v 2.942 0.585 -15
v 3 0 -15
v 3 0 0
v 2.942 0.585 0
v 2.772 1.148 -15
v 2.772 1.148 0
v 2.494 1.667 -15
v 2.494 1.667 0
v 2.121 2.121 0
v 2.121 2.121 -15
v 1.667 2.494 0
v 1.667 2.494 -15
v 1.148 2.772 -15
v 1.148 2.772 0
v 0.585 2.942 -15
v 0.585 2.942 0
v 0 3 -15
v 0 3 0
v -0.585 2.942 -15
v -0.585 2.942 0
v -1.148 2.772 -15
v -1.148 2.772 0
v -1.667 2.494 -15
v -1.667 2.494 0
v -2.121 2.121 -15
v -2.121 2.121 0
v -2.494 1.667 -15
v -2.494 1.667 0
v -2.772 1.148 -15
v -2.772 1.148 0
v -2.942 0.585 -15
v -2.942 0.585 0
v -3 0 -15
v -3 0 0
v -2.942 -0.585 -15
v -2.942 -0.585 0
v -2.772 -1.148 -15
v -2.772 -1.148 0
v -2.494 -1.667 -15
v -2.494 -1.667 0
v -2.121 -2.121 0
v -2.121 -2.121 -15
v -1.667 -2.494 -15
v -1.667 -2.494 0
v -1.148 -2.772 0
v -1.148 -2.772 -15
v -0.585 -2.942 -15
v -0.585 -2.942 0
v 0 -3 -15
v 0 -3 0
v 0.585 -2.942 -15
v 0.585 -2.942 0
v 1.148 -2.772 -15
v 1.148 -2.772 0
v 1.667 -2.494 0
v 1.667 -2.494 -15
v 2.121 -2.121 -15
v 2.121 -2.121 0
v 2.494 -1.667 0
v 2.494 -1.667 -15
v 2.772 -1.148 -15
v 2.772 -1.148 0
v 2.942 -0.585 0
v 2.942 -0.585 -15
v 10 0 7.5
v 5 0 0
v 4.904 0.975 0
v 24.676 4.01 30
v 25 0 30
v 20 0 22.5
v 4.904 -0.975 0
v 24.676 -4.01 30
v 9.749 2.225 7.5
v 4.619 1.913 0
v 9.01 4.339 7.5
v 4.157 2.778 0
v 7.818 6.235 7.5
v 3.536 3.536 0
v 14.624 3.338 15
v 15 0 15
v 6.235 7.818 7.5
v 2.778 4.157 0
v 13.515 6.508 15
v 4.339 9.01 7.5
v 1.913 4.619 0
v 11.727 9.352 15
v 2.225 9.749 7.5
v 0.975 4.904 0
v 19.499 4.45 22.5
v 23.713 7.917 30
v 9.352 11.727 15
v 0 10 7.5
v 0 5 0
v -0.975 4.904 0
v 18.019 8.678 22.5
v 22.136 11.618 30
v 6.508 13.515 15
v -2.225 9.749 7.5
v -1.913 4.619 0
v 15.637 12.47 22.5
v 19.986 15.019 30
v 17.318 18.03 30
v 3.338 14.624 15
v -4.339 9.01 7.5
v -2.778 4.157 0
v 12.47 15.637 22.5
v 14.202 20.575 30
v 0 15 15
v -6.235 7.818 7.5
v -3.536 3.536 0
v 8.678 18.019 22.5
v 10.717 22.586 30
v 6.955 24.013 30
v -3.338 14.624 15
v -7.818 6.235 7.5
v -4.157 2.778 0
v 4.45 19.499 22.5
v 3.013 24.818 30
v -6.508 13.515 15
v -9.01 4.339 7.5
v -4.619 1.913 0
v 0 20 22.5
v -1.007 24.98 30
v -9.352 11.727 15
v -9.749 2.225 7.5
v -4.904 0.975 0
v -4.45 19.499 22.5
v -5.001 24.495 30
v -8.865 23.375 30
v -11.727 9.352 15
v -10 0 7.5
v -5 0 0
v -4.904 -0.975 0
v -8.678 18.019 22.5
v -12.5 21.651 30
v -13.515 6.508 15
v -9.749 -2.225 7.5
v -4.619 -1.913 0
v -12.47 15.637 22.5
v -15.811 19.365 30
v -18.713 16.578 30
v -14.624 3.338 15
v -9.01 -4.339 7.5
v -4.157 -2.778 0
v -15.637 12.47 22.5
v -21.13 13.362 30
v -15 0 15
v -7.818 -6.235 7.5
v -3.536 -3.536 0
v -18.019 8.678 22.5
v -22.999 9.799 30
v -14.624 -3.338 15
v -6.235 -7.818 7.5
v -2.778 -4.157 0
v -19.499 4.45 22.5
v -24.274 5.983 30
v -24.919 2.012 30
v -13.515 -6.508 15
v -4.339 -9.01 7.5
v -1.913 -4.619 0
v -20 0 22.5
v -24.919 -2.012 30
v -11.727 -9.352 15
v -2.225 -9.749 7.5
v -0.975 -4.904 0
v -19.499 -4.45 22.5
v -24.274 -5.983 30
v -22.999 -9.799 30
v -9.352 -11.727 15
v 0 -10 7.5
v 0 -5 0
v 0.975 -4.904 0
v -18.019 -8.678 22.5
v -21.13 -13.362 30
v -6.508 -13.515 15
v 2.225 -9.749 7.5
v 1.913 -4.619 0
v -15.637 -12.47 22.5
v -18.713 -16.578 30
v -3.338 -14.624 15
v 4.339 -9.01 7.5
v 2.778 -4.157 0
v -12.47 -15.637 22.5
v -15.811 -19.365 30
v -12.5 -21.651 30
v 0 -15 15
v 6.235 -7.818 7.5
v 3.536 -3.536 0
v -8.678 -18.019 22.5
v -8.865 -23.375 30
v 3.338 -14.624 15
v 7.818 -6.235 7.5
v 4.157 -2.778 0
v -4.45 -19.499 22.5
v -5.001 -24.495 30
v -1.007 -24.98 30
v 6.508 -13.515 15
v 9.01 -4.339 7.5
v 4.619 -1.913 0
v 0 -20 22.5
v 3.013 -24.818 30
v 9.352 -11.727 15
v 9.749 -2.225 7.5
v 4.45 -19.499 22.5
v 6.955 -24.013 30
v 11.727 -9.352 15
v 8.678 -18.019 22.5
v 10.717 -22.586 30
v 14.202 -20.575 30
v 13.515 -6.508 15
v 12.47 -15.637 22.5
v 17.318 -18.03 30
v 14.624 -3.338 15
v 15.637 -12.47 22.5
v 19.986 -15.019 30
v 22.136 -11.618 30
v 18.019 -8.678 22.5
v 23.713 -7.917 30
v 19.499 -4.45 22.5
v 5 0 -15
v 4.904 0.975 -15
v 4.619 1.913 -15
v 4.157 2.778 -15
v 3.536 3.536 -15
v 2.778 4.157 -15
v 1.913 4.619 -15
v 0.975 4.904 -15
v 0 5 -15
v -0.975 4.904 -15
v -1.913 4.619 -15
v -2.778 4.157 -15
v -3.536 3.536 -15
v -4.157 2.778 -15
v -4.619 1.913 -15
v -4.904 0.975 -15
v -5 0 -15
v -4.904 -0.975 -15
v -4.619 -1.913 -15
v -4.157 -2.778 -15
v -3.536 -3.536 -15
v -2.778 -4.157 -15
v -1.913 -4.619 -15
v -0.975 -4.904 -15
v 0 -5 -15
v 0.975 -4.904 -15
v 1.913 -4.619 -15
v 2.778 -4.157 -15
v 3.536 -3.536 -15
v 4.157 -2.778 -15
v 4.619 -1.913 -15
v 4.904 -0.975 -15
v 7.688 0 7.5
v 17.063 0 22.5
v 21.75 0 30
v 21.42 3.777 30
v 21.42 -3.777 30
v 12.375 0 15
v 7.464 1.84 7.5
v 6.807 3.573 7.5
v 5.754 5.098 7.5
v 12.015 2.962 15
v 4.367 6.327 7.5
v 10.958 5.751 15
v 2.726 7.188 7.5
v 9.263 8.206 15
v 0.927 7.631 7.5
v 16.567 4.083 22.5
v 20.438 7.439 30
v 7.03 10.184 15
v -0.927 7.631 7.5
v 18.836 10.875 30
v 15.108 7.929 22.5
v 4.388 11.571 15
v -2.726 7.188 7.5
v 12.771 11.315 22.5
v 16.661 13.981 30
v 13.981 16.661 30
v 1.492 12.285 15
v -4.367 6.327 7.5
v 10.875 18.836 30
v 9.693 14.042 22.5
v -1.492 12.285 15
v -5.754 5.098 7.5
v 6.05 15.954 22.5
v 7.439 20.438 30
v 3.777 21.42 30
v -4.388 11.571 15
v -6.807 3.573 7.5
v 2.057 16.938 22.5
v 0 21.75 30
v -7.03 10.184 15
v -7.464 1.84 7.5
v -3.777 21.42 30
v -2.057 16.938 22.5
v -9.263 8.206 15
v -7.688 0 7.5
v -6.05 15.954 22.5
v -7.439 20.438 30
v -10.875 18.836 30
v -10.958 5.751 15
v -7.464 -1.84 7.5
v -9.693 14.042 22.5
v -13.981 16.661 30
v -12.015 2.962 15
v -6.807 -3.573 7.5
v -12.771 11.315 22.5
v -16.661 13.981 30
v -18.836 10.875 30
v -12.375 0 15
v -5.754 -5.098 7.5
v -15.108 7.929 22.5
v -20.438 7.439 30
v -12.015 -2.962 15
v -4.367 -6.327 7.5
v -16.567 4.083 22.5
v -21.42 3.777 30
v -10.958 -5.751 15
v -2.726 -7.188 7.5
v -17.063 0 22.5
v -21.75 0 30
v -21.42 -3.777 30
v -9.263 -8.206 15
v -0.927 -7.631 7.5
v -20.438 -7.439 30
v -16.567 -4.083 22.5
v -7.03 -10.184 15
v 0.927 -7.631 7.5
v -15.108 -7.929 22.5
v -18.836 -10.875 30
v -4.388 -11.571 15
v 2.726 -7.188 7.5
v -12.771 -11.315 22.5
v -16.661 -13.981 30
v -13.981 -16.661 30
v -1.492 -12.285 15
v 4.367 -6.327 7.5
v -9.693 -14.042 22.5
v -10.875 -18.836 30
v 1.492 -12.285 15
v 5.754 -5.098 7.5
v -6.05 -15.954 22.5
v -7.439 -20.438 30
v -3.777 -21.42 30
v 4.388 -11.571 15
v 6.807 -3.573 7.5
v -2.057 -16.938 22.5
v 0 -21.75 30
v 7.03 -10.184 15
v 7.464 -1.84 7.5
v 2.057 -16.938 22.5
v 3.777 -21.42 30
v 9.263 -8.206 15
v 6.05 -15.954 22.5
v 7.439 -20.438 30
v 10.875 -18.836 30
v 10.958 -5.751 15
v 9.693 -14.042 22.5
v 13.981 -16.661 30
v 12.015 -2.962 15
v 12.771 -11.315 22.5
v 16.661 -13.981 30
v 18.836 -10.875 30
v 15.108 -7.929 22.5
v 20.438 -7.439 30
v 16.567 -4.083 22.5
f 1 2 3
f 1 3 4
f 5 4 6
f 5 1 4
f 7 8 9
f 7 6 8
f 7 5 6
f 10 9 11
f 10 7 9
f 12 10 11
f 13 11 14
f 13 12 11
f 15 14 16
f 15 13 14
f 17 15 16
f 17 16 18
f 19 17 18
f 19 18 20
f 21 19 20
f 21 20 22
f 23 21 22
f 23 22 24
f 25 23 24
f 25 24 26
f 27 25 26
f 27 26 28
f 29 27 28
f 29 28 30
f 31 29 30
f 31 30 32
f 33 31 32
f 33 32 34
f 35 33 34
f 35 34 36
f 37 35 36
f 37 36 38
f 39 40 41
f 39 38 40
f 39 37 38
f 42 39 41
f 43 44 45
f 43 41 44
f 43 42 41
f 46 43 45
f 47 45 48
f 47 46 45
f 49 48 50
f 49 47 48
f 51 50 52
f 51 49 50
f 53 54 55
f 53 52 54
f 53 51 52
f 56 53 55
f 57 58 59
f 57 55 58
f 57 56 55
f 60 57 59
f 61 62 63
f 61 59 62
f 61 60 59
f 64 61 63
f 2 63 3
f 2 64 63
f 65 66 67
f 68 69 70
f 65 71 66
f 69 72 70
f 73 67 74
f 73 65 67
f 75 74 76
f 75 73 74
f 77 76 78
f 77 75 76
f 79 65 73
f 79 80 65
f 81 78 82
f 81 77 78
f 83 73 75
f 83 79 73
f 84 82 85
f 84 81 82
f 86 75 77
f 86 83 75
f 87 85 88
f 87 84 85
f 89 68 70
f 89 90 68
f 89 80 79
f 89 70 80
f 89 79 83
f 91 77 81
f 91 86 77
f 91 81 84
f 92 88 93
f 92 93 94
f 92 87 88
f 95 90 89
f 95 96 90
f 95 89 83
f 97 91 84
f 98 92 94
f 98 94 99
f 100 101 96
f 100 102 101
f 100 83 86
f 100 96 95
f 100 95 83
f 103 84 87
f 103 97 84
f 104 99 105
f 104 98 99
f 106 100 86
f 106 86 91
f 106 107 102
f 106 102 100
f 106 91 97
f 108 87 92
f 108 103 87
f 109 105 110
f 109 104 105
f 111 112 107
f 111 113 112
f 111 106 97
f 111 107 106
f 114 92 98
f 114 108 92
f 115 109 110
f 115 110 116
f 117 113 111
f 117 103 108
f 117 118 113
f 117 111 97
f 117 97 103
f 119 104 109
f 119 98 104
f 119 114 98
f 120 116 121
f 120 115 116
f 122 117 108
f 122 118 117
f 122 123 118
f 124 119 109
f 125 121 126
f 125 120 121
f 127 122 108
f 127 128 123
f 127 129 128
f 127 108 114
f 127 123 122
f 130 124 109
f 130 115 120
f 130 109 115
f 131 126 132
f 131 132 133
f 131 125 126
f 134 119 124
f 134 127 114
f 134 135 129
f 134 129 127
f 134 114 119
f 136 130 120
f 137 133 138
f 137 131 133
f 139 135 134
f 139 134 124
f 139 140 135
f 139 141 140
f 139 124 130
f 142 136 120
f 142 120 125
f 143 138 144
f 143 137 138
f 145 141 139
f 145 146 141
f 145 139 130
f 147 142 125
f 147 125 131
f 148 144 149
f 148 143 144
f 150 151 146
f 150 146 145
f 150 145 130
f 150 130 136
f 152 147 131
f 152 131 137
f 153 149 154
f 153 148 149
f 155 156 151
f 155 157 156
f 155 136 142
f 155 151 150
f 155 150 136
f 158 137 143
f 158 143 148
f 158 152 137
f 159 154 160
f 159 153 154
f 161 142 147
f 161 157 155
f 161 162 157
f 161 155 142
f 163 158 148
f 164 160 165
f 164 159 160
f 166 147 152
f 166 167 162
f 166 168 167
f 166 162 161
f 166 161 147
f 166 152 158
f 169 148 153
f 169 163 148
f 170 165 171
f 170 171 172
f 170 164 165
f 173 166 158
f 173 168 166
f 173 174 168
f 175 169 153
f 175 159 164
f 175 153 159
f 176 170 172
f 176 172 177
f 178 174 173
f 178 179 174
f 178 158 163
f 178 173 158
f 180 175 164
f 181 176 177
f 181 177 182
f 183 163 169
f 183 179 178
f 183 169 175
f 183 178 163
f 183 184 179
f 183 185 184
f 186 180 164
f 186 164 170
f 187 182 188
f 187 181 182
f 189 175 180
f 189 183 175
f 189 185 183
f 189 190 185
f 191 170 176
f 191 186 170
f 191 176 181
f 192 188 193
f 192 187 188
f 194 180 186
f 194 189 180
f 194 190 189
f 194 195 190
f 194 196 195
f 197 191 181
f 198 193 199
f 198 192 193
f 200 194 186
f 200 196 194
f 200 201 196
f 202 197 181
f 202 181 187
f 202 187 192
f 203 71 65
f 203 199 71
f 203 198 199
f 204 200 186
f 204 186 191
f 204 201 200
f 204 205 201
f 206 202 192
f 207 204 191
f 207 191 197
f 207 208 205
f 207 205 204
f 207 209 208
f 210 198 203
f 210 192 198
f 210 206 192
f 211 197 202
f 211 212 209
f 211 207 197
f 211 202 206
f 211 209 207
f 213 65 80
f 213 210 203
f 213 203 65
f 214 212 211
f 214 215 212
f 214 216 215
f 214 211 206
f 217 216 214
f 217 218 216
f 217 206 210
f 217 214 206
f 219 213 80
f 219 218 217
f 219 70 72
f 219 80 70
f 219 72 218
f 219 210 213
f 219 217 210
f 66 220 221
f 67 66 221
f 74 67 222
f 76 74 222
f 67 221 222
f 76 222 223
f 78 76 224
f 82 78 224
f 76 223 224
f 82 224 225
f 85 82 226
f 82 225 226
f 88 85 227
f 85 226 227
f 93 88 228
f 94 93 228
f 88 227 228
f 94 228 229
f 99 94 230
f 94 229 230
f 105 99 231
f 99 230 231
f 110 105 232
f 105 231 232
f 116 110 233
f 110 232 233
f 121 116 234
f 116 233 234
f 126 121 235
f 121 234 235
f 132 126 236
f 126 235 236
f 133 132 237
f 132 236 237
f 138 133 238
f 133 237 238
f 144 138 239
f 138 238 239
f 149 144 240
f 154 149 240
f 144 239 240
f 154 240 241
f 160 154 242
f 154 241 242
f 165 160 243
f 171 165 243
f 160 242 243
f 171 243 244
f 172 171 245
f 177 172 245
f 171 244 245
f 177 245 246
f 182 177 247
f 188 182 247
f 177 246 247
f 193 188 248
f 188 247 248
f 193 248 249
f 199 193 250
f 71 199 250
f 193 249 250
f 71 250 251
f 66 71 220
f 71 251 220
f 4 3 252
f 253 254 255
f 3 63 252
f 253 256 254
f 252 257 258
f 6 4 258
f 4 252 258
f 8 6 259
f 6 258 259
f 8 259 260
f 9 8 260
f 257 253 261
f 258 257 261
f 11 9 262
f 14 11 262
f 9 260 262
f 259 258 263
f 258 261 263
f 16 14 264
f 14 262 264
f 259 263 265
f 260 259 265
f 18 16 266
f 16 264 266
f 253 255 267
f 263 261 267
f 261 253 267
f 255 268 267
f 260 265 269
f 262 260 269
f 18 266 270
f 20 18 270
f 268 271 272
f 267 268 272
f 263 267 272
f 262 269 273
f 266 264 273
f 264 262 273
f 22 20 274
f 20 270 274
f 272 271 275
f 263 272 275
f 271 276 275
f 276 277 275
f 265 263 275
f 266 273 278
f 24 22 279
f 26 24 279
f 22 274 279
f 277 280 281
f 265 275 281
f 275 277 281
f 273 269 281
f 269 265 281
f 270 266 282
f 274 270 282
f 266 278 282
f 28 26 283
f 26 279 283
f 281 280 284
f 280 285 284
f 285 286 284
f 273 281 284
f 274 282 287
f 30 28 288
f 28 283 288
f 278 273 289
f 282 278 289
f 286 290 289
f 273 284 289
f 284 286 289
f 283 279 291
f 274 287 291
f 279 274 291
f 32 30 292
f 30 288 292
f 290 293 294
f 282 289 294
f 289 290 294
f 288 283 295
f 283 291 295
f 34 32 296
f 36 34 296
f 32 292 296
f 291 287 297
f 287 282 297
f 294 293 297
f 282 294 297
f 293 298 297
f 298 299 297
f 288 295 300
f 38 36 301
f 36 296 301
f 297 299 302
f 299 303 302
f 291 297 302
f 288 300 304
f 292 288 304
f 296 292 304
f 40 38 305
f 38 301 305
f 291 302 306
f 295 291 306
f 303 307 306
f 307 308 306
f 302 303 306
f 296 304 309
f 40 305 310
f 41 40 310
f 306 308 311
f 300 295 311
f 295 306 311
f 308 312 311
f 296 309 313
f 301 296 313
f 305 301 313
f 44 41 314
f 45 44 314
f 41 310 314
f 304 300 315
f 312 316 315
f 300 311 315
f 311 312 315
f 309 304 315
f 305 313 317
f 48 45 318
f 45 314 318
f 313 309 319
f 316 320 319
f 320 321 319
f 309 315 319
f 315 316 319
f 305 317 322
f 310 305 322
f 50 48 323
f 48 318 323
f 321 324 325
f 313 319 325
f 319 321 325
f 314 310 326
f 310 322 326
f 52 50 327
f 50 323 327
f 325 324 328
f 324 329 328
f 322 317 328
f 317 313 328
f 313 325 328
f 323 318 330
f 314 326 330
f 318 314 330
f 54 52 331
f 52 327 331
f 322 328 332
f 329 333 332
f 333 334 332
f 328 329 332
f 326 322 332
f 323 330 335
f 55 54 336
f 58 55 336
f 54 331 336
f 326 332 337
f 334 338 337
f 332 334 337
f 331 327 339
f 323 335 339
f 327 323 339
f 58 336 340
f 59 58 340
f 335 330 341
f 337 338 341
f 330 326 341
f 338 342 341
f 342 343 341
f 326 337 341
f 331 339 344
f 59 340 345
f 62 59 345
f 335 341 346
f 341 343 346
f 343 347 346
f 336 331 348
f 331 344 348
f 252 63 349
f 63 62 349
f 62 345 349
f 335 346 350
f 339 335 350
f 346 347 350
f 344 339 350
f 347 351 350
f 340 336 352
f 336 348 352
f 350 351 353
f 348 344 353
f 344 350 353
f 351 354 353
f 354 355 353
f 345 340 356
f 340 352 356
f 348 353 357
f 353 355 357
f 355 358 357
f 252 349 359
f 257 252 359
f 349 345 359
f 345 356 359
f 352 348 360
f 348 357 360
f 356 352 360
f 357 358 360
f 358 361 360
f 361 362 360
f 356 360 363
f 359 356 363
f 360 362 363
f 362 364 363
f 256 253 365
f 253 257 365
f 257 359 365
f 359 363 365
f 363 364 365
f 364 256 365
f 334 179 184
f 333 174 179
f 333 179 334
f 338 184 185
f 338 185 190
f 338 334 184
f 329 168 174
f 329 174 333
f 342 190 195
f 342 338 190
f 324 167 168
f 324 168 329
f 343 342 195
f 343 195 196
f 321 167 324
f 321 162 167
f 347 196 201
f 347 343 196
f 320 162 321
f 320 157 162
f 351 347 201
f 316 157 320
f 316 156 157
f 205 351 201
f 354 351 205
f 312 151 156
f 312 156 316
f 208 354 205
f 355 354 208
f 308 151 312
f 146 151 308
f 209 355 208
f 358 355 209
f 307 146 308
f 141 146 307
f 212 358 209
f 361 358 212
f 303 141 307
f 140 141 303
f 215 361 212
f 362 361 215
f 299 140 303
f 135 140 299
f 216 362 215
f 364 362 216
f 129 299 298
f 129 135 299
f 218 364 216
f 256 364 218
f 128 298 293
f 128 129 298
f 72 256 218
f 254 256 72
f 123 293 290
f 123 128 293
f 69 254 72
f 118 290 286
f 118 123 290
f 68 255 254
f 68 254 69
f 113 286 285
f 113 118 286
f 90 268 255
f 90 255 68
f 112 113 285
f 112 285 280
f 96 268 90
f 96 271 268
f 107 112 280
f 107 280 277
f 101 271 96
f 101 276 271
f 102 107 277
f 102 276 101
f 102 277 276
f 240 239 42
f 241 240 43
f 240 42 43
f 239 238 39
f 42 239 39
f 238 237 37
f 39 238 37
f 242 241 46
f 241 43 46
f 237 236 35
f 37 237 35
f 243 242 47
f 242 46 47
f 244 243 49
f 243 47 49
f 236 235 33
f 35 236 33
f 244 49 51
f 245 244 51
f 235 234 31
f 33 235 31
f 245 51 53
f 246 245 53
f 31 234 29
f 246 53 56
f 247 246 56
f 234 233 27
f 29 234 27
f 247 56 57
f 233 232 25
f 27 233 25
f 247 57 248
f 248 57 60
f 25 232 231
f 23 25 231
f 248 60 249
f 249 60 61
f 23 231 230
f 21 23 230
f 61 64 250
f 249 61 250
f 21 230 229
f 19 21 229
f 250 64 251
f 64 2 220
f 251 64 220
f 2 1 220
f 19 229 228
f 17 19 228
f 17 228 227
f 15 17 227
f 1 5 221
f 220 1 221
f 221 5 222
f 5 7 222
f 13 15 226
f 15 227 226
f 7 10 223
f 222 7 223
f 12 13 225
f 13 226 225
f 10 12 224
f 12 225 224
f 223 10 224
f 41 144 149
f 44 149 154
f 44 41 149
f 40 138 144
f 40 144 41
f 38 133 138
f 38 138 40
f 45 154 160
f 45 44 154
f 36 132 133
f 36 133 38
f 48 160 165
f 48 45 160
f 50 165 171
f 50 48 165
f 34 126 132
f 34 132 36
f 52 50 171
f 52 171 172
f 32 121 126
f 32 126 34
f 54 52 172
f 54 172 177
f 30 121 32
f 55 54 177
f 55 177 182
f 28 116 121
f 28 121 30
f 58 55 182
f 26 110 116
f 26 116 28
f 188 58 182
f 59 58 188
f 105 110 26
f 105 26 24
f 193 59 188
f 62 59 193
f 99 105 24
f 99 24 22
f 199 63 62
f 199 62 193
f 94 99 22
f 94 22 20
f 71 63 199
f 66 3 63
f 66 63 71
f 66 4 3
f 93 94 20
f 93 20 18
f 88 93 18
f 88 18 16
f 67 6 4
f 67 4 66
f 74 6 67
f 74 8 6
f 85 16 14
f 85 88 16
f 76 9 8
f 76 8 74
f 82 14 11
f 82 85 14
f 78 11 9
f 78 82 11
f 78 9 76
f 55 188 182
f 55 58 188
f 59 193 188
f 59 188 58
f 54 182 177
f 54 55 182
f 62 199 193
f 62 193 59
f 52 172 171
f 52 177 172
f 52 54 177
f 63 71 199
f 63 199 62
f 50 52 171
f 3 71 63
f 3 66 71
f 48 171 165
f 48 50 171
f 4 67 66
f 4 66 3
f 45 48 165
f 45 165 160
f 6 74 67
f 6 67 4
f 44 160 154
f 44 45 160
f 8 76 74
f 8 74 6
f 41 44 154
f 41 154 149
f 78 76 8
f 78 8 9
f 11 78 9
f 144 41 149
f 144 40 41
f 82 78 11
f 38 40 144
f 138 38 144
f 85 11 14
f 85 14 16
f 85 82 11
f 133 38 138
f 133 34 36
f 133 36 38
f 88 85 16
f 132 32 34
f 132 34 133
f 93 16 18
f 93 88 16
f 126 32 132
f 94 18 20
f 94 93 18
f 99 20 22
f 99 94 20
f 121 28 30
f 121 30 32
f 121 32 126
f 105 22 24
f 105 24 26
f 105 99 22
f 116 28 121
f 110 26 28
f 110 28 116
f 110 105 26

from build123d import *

# Parameters (mm, degrees)
CYLINDER001_R     = 3
CYLINDER001_DEPTH = 23
CYLINDER_R        = 5
CYLINDER_DEPTH    = 15


with BuildPart() as cone001:
    # Cone001 → Cone001 (revolve)
    with BuildSketch(Plane.XZ):
        Polygon((0, 0), (3, 0), (23, 32), (0, 32), align=None)
    revolve(axis=Axis((0, 0, 0), (0, 0, 1)))


with BuildPart() as cut:
    # Cone → Cone (revolve)
    with BuildSketch(Plane.XZ):
        Polygon((0, 0), (5, 0), (25, 30), (0, 30), align=None)
    revolve(axis=Axis((0, 0, 0), (0, 0, 1)))

    # Cut: cut Cone001
    add(cone001.part, mode=Mode.SUBTRACT)


with BuildPart() as cylinder001:
    # Cylinder001 → Cylinder001 (new body)
    with BuildSketch(Plane.XY.offset(-19)):
        Circle(CYLINDER001_R)
    extrude(amount=CYLINDER001_DEPTH)


with BuildPart() as cut001:
    # Cylinder → Cylinder (new body)
    with BuildSketch(Plane.XY.offset(-15)):
        Circle(CYLINDER_R)
    extrude(amount=CYLINDER_DEPTH)

    # Cut001: cut Cylinder001
    add(cylinder001.part, mode=Mode.SUBTRACT)


solid = Compound([cut.part, cut001.part])
